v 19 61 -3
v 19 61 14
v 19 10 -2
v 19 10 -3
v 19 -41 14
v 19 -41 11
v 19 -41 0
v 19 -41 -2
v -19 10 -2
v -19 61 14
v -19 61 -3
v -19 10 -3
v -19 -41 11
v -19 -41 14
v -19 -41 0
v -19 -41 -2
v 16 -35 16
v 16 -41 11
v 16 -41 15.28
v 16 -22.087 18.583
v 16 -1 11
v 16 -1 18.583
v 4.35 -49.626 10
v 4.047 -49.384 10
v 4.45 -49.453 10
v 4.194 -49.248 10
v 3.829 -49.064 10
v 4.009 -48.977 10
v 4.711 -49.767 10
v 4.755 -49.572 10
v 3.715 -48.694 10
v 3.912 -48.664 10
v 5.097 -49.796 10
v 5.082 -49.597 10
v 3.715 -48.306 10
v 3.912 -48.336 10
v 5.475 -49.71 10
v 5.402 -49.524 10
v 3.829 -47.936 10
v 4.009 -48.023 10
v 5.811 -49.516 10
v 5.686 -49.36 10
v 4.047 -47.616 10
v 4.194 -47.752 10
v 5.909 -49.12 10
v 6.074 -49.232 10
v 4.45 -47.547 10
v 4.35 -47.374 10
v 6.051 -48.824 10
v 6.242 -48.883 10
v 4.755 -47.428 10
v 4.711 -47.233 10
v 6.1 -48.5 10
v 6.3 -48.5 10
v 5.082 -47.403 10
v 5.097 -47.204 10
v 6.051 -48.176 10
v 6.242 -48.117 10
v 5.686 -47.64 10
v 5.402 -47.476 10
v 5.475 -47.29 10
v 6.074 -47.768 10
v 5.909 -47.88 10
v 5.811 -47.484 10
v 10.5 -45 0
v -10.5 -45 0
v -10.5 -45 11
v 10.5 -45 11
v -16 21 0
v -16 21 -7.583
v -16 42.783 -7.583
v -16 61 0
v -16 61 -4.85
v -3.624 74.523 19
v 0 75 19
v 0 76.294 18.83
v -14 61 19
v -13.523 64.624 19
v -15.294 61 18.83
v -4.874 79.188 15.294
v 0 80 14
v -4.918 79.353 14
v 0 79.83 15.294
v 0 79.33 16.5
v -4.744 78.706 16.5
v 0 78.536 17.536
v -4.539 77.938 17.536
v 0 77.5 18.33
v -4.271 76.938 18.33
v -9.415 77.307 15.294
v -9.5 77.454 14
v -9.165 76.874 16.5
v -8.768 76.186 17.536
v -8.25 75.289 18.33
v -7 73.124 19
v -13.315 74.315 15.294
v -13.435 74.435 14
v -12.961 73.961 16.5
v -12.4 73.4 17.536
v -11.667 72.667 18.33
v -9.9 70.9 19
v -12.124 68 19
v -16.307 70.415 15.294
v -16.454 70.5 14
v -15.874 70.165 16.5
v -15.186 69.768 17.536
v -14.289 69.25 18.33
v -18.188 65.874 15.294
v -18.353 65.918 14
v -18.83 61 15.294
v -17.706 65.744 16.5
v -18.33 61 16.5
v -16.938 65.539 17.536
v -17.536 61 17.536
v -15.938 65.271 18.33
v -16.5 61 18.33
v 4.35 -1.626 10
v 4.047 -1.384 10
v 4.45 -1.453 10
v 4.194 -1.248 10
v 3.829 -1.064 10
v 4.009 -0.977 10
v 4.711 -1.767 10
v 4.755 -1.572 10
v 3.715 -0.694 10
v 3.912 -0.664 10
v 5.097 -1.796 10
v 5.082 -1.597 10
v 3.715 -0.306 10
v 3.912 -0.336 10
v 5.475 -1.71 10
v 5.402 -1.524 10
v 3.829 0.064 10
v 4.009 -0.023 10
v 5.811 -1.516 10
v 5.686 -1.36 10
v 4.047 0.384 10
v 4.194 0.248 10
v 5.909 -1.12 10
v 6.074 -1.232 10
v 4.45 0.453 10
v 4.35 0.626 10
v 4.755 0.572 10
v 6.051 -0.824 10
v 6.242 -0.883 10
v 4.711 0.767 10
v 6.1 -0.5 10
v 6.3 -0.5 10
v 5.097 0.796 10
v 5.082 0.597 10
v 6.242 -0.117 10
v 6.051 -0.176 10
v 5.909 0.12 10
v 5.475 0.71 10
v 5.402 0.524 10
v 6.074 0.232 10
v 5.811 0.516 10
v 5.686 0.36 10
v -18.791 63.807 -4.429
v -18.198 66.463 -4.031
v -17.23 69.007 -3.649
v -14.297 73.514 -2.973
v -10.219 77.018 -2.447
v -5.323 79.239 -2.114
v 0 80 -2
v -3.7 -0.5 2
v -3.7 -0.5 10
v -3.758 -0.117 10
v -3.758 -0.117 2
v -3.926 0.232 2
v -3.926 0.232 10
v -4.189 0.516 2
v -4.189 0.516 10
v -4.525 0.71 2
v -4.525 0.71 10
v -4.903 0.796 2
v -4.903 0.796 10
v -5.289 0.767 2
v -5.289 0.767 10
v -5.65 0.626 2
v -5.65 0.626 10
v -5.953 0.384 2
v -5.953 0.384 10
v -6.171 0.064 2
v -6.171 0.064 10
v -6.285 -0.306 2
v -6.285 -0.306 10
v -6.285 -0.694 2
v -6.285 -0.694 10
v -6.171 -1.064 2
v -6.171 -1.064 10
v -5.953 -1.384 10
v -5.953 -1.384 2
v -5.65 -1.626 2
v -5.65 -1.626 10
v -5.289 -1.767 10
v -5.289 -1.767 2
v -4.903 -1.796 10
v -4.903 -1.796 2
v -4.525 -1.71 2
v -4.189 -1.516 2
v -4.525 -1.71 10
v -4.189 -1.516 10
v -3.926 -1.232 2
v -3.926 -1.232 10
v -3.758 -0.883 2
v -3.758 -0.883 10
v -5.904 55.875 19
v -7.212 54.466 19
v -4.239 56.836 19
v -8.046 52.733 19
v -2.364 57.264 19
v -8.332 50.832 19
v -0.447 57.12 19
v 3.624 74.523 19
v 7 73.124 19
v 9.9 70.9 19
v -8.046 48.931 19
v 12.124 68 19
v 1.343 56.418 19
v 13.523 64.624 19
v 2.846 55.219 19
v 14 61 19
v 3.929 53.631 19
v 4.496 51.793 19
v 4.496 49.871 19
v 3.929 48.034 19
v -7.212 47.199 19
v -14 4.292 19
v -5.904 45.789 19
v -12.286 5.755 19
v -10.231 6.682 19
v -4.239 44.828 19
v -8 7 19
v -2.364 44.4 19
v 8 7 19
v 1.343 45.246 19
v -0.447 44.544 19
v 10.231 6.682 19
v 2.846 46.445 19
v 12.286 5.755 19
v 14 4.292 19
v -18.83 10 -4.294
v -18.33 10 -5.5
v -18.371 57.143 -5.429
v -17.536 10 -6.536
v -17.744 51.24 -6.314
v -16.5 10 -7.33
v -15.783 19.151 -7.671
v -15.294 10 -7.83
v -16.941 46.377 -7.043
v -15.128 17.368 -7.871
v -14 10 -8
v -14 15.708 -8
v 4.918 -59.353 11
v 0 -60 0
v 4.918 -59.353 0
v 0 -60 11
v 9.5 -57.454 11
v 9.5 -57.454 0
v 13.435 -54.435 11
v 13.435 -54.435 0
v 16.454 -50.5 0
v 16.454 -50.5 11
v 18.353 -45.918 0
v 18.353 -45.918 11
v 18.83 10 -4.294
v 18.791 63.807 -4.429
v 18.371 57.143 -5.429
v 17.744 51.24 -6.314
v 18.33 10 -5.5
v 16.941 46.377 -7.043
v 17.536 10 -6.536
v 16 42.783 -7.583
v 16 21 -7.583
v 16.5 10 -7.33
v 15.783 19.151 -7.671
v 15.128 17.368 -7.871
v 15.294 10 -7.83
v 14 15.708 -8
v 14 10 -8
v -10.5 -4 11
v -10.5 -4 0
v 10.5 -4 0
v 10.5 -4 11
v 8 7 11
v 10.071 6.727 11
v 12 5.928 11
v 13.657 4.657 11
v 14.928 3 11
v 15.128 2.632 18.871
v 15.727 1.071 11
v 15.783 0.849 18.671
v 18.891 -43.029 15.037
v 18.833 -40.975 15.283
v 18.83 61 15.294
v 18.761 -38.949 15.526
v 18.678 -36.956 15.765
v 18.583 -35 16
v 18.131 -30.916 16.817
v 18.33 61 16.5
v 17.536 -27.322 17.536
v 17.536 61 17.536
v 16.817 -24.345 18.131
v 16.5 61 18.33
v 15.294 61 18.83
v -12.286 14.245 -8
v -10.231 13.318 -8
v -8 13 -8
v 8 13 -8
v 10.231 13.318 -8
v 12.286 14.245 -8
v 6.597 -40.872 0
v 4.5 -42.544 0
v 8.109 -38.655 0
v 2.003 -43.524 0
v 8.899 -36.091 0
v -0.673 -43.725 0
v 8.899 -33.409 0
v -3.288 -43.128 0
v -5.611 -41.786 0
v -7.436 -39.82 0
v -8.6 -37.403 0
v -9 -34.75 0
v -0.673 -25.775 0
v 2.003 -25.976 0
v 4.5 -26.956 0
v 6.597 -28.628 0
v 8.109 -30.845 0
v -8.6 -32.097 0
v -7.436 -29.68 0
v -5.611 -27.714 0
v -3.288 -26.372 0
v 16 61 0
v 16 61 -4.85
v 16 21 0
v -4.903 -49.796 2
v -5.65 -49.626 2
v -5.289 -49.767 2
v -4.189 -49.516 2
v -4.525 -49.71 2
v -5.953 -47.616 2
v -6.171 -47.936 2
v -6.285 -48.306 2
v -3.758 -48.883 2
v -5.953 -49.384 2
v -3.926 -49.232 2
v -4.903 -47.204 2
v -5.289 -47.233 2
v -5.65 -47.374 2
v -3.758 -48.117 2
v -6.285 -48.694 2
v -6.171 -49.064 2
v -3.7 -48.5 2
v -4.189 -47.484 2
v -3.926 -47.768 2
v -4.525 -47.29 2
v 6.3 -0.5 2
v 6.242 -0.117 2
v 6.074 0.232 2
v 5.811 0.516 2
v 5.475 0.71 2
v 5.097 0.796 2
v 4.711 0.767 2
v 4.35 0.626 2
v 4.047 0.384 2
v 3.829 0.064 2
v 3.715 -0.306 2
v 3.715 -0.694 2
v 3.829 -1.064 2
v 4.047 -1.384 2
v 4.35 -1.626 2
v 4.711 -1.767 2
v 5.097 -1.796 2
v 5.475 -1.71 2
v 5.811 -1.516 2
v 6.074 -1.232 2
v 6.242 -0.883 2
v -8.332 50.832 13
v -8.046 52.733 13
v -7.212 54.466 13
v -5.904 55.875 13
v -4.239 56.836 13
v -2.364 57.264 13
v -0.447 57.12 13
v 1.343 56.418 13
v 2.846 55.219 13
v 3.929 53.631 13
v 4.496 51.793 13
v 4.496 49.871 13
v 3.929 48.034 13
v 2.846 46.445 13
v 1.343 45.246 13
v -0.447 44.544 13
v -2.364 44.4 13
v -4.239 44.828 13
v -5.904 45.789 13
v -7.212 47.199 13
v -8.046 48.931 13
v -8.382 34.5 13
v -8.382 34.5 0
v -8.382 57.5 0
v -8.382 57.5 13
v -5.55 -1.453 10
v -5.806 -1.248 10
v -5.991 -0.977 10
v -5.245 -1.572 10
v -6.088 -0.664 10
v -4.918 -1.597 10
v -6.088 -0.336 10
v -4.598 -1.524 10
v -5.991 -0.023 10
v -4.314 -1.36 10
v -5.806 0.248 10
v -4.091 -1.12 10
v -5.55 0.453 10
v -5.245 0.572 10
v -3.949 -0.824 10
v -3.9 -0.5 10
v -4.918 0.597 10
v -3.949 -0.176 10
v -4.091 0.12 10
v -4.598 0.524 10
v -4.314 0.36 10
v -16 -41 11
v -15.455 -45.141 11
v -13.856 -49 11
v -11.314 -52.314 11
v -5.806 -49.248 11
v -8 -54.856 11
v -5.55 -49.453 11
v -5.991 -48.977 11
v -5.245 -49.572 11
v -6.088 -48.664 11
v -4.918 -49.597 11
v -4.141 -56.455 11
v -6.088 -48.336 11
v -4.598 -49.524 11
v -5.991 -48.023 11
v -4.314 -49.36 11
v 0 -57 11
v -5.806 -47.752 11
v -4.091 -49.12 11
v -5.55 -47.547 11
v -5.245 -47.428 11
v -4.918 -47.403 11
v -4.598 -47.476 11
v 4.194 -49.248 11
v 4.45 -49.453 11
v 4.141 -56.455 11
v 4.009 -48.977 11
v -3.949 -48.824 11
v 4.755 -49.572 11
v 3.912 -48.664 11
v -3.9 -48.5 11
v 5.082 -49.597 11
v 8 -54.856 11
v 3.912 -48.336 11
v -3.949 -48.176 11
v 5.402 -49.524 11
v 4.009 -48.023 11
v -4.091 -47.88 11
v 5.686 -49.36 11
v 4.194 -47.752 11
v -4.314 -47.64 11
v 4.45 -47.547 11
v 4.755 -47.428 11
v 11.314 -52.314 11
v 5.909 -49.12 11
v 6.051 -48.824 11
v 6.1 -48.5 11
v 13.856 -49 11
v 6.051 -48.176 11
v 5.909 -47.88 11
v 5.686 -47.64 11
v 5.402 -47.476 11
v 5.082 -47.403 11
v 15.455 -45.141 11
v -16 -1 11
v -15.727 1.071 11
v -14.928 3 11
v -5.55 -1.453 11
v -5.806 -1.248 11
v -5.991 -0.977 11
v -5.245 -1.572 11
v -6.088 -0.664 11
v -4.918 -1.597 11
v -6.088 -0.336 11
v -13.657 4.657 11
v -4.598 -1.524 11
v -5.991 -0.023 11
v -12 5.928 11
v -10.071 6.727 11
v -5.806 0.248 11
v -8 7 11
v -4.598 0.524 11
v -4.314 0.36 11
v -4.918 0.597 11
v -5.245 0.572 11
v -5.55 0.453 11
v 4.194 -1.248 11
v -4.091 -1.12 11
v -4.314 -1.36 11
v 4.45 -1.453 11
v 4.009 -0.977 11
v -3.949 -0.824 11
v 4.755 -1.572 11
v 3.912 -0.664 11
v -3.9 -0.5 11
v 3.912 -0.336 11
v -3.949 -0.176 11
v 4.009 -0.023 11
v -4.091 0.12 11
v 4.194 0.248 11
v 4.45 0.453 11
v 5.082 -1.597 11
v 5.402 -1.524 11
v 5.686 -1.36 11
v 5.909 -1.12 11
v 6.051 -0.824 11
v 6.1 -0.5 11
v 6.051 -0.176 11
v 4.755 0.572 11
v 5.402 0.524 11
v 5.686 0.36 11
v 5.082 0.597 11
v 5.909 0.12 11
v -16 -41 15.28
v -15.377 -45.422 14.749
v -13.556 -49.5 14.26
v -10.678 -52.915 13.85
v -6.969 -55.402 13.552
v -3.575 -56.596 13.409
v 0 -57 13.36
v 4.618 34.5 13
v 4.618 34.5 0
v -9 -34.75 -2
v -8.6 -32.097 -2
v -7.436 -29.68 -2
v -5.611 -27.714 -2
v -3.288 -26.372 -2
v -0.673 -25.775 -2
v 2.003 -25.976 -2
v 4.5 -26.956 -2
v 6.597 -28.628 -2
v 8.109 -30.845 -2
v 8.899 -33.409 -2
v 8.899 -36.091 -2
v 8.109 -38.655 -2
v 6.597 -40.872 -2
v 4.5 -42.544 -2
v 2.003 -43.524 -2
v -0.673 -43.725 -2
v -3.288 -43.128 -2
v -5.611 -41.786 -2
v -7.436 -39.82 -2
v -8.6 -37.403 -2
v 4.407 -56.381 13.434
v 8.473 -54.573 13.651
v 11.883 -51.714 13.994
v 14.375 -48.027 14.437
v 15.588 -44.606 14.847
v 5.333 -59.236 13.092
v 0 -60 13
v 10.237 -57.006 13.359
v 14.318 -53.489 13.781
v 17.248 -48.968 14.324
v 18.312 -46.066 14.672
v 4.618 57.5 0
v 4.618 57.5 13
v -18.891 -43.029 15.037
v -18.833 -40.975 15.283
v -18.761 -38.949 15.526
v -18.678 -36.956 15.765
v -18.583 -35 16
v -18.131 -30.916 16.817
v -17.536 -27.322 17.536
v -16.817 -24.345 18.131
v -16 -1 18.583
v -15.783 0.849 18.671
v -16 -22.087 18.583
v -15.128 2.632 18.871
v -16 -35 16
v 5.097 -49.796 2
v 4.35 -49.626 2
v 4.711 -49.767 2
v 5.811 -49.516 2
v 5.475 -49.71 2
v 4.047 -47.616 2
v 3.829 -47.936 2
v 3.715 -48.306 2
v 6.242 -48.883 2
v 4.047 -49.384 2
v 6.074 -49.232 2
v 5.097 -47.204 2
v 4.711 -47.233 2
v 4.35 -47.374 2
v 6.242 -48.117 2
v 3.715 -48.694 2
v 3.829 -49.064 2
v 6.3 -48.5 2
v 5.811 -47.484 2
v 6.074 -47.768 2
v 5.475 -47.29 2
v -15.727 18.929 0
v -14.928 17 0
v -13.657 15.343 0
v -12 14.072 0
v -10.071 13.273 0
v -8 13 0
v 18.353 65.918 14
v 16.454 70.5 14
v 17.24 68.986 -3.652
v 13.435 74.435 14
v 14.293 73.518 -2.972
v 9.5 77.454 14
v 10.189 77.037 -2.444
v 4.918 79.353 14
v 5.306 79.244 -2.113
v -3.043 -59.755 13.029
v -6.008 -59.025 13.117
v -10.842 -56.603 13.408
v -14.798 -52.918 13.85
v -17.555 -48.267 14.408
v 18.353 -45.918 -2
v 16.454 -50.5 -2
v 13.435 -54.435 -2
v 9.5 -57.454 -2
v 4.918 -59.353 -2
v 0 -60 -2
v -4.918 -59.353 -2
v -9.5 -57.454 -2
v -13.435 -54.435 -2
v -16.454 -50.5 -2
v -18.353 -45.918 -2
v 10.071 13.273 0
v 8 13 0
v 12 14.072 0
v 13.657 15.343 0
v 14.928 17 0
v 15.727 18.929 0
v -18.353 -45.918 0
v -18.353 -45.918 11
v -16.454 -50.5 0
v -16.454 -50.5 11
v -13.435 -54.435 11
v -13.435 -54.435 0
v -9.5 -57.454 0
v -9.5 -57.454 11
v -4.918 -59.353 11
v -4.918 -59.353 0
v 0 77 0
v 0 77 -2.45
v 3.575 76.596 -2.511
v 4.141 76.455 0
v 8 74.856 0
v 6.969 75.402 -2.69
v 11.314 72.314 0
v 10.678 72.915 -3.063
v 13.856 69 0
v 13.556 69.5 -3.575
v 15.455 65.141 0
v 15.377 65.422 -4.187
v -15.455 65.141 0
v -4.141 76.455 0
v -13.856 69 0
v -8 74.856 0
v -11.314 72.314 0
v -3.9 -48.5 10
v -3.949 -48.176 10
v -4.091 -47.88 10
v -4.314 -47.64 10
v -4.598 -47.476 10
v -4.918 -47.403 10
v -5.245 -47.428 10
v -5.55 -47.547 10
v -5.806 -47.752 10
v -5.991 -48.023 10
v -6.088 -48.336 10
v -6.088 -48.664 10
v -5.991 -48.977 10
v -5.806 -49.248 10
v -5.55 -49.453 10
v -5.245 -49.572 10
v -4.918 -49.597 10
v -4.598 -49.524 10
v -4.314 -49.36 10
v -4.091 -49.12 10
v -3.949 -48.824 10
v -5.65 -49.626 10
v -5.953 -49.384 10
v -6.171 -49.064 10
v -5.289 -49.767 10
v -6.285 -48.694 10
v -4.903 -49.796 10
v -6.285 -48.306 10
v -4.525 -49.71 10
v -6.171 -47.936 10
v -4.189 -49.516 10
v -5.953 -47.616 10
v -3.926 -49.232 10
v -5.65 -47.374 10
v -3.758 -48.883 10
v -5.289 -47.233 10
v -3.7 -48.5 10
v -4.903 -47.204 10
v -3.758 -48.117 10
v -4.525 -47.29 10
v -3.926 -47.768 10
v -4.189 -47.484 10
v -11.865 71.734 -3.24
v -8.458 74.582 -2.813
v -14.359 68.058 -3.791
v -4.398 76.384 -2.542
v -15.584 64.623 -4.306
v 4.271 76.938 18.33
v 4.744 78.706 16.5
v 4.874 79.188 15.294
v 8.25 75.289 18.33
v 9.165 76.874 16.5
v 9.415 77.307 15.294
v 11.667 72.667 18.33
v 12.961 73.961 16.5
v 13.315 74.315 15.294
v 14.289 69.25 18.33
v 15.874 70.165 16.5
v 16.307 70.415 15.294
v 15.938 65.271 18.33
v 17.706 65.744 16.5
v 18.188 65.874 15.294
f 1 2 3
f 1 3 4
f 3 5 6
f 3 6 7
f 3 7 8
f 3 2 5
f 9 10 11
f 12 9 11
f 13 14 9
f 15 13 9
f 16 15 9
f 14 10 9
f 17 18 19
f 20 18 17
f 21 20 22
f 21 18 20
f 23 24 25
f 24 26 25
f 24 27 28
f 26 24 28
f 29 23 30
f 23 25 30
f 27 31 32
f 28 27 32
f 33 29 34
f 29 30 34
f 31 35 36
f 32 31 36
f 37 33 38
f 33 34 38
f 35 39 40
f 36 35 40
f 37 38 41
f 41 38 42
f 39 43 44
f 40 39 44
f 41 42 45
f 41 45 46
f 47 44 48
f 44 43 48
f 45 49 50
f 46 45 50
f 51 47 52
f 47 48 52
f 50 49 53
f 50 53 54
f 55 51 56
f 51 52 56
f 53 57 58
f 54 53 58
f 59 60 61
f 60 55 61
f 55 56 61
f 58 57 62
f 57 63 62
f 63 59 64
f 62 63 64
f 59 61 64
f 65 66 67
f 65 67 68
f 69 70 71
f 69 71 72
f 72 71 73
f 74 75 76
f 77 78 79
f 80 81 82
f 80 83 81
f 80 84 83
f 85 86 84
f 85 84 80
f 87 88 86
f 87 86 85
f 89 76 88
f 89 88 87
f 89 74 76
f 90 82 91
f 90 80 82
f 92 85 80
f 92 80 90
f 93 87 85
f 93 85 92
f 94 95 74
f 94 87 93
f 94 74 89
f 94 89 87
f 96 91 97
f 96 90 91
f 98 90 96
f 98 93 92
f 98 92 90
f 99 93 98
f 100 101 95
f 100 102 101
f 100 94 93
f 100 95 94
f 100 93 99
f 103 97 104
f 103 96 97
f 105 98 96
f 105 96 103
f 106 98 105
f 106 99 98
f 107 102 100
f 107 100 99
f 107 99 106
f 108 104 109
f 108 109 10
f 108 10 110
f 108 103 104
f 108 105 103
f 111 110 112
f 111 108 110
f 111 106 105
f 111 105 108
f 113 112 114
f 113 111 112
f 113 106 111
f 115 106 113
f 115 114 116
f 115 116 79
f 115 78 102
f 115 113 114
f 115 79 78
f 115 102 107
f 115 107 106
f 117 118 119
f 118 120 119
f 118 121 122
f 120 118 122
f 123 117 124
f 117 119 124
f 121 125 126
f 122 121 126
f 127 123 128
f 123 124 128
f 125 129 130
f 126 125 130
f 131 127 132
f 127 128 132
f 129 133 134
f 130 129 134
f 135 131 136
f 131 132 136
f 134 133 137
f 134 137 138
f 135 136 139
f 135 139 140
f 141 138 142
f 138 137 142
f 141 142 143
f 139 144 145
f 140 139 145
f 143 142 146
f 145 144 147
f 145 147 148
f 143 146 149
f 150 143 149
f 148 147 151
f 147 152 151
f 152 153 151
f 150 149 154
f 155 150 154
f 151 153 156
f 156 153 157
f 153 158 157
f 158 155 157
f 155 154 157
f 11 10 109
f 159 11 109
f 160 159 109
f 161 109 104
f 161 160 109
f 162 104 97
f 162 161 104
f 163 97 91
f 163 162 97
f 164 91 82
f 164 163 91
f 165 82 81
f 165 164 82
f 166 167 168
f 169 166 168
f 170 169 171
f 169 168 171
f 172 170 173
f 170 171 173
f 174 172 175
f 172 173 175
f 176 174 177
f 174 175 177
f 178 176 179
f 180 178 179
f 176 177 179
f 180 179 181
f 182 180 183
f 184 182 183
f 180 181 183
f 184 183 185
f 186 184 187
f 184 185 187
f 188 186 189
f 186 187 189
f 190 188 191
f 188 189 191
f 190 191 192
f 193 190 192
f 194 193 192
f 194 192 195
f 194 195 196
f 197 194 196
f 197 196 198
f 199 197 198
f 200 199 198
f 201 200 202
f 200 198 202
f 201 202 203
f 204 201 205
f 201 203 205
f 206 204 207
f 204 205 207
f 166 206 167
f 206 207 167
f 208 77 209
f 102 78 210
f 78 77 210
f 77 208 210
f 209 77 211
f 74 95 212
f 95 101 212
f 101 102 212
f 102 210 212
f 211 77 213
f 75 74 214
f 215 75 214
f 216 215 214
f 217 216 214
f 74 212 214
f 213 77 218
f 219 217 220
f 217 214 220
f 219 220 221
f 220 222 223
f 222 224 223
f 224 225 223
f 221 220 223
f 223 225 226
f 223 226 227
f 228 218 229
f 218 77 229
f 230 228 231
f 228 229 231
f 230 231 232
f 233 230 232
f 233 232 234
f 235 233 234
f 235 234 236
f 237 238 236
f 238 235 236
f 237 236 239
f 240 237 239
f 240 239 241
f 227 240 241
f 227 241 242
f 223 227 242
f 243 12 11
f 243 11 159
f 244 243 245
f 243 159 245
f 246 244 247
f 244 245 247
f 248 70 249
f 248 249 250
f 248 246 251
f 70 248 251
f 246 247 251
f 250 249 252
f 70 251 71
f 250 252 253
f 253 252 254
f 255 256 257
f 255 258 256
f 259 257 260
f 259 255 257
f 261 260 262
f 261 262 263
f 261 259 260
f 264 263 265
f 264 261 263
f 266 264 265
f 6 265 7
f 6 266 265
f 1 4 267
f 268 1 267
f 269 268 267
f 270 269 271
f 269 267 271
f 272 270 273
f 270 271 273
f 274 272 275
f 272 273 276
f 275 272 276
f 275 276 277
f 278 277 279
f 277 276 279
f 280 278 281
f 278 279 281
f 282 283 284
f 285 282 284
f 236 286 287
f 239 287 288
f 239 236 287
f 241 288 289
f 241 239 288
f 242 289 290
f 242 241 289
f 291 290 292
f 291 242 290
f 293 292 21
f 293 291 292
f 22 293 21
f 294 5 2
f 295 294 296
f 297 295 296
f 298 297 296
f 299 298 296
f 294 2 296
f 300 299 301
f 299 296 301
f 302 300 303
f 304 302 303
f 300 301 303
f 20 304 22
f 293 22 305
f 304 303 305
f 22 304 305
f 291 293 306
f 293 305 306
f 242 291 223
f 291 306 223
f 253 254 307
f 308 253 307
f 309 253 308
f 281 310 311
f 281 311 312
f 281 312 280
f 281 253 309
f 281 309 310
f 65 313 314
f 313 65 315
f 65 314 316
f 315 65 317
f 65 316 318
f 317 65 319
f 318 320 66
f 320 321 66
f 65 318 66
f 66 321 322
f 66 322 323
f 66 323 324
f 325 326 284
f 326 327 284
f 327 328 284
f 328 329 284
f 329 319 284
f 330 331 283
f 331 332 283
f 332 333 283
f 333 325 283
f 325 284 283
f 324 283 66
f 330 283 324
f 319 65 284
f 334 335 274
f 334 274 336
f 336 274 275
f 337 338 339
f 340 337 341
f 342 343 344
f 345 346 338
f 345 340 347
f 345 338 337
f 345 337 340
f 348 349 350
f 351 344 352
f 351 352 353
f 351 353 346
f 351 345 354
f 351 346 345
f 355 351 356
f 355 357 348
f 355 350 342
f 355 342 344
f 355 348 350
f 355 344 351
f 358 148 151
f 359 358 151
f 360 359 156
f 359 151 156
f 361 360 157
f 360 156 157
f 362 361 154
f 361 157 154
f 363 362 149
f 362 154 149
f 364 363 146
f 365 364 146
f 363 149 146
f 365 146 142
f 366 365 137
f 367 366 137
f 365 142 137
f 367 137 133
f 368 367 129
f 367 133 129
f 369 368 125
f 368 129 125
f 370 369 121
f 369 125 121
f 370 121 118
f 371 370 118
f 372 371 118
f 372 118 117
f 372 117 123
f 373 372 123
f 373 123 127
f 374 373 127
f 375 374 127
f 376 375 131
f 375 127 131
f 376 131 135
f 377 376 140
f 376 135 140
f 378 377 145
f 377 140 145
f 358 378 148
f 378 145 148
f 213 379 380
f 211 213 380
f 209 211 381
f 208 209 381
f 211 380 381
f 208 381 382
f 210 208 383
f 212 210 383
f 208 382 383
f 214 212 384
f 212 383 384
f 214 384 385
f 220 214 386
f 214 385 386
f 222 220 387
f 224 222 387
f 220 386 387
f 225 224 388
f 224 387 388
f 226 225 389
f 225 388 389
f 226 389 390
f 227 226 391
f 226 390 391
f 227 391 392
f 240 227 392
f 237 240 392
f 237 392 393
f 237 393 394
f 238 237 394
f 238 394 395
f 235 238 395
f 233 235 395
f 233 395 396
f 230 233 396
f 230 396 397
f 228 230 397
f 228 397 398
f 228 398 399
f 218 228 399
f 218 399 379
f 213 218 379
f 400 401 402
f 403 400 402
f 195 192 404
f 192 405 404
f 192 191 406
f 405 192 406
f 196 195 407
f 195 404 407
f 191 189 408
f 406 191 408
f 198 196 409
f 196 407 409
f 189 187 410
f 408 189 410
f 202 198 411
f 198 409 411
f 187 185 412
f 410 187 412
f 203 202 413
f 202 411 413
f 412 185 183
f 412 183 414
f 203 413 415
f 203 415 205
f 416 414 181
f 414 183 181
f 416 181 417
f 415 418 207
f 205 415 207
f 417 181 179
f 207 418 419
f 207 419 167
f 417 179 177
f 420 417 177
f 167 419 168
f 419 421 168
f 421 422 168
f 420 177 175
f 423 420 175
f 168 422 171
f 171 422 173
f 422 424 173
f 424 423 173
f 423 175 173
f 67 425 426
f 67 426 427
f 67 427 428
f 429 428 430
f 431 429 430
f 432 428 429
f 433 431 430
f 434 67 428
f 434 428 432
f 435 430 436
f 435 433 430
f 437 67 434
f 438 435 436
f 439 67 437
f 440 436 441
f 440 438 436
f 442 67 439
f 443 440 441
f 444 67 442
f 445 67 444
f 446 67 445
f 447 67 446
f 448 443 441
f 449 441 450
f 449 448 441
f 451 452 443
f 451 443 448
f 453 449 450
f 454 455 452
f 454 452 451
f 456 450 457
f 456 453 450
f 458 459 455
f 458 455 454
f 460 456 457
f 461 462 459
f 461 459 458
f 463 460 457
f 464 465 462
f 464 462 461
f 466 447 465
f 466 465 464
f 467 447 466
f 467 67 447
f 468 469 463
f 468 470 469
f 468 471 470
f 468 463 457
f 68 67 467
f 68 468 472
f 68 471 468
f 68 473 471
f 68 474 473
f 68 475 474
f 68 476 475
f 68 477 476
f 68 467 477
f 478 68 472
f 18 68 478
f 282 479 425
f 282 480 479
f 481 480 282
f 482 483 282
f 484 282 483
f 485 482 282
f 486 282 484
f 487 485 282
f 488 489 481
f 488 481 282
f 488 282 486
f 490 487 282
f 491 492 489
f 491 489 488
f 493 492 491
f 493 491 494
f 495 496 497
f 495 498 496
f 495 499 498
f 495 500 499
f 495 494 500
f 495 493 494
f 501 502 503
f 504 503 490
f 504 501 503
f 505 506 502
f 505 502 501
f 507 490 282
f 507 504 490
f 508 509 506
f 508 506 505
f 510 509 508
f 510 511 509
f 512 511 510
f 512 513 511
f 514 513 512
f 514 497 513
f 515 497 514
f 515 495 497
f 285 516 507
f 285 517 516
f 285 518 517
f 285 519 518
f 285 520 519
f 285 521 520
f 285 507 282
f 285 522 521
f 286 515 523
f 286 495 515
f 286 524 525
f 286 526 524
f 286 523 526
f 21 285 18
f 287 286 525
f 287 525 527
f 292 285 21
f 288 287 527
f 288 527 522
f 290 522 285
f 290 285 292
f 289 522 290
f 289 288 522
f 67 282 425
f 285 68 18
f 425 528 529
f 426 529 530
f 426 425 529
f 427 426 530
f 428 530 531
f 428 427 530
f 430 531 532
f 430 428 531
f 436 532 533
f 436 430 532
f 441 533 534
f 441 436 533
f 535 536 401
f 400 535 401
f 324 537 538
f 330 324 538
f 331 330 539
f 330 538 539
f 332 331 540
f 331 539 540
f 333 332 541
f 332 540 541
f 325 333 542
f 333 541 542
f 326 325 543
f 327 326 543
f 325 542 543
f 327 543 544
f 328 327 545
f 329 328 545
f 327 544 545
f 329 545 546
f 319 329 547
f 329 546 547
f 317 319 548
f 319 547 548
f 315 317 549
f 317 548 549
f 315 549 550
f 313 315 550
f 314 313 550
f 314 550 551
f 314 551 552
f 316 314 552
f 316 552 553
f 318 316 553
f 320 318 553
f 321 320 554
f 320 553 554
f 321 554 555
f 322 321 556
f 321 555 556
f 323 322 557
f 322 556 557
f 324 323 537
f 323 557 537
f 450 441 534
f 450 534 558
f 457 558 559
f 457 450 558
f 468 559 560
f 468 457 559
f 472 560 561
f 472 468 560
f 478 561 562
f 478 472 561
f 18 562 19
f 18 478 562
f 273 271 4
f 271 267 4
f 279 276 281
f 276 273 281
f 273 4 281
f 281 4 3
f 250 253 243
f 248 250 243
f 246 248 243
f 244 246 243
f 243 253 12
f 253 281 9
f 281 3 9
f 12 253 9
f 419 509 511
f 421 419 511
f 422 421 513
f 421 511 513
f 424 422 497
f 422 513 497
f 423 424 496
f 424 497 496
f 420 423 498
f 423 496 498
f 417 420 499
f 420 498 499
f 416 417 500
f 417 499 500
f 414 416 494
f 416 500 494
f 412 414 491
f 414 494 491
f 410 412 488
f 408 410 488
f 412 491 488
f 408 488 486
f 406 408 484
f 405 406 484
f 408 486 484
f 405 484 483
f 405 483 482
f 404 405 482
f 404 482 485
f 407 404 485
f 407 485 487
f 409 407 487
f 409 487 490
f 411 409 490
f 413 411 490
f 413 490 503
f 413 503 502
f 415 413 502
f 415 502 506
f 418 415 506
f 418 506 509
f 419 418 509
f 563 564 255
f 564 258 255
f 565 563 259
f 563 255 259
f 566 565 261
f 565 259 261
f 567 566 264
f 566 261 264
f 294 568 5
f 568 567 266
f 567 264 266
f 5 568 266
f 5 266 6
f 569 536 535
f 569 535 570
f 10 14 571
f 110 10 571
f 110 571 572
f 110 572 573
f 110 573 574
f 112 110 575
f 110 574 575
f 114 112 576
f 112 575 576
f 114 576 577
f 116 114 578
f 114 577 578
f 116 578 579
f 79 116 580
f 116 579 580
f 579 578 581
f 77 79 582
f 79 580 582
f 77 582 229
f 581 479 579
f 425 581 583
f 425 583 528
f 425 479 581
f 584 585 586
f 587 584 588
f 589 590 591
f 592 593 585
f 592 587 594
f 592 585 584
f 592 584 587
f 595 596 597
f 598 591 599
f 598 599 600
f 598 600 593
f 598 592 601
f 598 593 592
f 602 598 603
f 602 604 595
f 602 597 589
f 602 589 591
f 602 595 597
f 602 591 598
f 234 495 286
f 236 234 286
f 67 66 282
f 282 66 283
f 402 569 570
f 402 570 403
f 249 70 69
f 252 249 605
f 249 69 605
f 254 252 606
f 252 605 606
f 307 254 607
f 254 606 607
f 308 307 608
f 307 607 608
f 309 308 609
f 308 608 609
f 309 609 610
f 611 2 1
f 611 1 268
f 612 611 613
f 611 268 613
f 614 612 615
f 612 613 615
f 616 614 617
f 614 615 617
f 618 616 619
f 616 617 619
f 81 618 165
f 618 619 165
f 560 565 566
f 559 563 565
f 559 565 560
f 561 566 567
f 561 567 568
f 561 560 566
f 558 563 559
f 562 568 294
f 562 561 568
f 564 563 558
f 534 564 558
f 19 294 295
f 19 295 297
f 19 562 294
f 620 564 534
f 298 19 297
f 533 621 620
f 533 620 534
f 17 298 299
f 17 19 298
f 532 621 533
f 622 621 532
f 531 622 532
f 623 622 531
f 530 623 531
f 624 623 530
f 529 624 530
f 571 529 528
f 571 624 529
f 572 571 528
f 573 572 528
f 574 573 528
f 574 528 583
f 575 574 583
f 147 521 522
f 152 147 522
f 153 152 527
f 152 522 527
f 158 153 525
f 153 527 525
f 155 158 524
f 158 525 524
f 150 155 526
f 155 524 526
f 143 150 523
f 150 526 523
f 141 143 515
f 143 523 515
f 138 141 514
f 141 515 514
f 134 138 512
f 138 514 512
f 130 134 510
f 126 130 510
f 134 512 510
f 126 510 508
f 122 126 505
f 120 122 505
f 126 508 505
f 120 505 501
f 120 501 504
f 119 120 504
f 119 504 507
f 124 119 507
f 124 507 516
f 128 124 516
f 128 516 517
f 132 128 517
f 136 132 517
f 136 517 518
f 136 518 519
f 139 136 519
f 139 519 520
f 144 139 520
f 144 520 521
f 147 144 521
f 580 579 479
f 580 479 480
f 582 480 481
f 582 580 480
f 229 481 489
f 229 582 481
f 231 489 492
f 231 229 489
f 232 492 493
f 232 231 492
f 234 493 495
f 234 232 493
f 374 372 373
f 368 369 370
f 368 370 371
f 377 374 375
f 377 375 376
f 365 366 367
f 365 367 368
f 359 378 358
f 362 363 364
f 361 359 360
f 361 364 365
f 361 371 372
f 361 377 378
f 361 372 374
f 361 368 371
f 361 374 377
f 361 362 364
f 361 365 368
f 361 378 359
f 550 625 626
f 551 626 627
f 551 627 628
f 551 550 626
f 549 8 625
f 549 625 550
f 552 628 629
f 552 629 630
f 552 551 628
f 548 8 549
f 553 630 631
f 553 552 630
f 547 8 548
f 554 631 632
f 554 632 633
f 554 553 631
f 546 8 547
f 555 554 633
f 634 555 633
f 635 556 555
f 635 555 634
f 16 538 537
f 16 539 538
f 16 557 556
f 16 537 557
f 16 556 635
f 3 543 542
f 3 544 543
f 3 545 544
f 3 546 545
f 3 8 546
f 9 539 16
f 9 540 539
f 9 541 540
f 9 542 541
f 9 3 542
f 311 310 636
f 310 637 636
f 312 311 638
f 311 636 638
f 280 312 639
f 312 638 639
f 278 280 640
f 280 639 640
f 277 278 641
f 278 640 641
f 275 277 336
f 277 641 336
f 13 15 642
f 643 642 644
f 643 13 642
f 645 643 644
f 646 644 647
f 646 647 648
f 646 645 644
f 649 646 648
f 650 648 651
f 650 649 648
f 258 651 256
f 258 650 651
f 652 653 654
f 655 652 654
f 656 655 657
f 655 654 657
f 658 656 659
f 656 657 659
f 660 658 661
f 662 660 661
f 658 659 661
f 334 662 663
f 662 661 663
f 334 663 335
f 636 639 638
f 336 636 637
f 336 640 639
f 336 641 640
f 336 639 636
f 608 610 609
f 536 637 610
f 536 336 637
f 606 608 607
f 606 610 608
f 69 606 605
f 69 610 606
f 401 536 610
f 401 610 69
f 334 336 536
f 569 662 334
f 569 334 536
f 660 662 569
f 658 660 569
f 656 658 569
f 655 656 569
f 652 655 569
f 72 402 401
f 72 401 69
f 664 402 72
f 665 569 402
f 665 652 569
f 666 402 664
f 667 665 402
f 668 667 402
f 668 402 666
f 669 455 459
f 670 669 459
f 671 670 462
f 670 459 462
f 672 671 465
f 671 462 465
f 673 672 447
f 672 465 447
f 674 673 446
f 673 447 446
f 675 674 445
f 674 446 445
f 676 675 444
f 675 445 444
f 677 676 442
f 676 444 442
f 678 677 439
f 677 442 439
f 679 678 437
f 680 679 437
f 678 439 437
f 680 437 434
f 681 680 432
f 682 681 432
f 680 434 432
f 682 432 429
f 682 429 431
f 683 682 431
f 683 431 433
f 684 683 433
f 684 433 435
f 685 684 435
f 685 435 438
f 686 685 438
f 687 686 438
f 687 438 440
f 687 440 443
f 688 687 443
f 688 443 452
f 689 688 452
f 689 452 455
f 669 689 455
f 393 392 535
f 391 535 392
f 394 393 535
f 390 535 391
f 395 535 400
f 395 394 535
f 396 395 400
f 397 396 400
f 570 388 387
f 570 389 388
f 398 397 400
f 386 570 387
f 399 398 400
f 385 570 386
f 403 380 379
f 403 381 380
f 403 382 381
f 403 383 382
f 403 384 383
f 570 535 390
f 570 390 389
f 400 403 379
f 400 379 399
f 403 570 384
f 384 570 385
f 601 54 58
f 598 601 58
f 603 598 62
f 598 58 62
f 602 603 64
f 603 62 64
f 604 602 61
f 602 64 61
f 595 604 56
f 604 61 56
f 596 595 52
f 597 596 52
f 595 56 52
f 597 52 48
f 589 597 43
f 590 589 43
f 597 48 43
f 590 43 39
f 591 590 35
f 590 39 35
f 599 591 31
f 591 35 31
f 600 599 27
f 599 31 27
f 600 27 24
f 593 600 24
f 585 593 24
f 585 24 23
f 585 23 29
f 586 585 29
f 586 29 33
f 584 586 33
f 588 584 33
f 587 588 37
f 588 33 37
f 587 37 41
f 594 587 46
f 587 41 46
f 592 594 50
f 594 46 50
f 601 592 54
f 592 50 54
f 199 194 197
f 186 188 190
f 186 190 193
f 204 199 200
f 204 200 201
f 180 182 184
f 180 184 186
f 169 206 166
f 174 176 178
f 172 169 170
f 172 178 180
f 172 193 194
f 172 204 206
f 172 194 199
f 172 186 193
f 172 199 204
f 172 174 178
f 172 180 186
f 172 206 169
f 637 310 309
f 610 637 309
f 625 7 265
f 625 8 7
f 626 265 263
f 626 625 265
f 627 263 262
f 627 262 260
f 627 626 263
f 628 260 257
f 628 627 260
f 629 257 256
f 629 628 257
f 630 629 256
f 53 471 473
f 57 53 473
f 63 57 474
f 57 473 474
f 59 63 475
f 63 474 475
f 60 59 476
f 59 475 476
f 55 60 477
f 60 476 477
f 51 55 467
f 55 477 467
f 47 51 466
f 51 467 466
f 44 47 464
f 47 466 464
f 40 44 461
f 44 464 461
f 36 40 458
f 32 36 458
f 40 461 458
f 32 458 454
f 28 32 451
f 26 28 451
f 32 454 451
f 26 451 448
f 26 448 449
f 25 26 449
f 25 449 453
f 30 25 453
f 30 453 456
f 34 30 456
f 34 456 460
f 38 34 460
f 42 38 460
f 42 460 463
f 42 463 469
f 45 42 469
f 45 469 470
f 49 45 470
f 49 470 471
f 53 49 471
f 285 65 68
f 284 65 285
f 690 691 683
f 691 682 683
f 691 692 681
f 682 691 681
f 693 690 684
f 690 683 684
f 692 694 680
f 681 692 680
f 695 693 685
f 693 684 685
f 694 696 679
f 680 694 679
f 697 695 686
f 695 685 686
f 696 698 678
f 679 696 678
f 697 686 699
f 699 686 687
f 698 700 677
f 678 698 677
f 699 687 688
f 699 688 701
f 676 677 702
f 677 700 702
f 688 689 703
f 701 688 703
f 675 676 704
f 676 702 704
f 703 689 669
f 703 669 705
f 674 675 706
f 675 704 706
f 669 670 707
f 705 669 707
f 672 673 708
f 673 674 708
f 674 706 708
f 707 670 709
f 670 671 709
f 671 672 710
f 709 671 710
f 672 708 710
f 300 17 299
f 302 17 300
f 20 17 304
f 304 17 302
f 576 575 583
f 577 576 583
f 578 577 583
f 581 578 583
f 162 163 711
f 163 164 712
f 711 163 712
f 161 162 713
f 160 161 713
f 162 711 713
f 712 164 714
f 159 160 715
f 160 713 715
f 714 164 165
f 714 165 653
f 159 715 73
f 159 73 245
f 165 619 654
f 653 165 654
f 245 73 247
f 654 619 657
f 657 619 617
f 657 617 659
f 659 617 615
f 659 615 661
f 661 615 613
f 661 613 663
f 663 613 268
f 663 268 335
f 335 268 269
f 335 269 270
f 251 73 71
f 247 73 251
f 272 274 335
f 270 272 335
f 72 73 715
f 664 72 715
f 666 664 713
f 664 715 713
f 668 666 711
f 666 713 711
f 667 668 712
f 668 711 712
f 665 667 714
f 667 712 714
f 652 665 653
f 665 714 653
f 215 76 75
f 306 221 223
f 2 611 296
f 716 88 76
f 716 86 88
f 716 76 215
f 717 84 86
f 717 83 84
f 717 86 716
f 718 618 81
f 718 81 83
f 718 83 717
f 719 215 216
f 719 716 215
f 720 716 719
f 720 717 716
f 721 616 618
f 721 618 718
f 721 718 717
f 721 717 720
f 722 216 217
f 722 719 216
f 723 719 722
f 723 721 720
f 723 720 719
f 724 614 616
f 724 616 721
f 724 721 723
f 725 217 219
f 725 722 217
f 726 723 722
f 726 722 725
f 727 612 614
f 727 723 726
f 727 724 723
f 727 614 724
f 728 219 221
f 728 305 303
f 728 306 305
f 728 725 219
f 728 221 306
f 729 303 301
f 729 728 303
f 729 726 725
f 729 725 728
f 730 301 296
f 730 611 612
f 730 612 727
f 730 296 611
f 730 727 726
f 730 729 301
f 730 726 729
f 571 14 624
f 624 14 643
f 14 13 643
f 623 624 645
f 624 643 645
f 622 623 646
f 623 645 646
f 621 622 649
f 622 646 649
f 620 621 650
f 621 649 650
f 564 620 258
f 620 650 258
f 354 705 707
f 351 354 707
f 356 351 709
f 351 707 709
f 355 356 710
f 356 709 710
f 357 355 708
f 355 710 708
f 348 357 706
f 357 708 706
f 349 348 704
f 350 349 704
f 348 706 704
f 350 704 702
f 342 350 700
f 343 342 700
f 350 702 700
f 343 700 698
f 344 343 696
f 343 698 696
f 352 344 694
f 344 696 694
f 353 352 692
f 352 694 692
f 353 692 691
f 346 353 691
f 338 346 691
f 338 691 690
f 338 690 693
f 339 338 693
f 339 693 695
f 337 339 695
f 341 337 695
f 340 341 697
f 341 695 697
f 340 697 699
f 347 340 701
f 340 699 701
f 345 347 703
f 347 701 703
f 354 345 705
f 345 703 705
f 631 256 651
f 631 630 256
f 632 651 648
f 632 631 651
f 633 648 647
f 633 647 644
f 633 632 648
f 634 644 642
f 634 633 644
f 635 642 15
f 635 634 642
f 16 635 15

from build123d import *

# Parameters (mm, degrees)
SKETCH1_W               = 38
SKETCH1_H               = 120
SKETCH1_W_2             = 21
SKETCH1_H_2             = 41
BOSS_EXTRUDE1_DEPTH     = 11
SKETCH3_R               = 1.3
CUT_EXTRUDE1_DEPTH      = 8
FILLET3_R               = 19
BOSS_EXTRUDE2_DEPTH     = 8
CUT_EXTRUDE2_DEPTH      = 66.741919656
CUT_EXTRUDE2_DEPTH_BACK = 66.741919656
SKETCH7_W               = 32
SKETCH7_H               = 50
BOSS_EXTRUDE4_DEPTH     = 8
SKETCH8_W               = 38
SKETCH8_H               = 50
BOSS_EXTRUDE5_DEPTH     = 8
BOSS_EXTRUDE10_START    = 2
SKETCH27_R              = 9
BOSS_EXTRUDE10_DEPTH    = 2
SKETCH28_W              = 38
SKETCH28_H              = 27
BOSS_EXTRUDE11_DEPTH    = 20
FILLET4_R               = 19
CUT_EXTRUDE14_DEPTH     = 8
CUT_EXTRUDE18_DEPTH     = 91.581455056
FILLET7_R               = 5
SKETCH35_R              = 1.1
CUT_EXTRUDE20_DEPTH     = 8
FILLET8_R               = 8
SKETCH36_R              = 6.45
CUT_EXTRUDE21_DEPTH     = 85.391942883
SKETCH30_W              = 13
SKETCH30_H              = 23
CUT_EXTRUDE22_DEPTH     = 13


# Some blends are built 0.0001 mm under size
with BuildPart() as part:
    # Sketch1 → Boss-Extrude1 (new body)
    with BuildSketch(Plane.XY):
        Rectangle(SKETCH1_W, SKETCH1_H)
        with Locations((0, -24.5)):
            Rectangle(SKETCH1_W_2, SKETCH1_H_2, mode=Mode.SUBTRACT)
    extrude(amount=BOSS_EXTRUDE1_DEPTH)

    # Sketch3 → Cut-Extrude1 (cut)
    with BuildSketch(Plane.XY.offset(10)):
        with Locations((-5, -0.5)):
            Circle(SKETCH3_R)
        with Locations((5, -0.5)):
            Circle(SKETCH3_R)
        with Locations((5, -48.5)):
            Circle(SKETCH3_R)
        with Locations((-5, -48.5)):
            Circle(SKETCH3_R)
    extrude(amount=-CUT_EXTRUDE1_DEPTH, mode=Mode.SUBTRACT)

    # Fillet3
    fillet3_edges = [part.edges().sort_by_distance(p)[0] for p in [
        (19, -60, 5.5),
        (-19, -60, 5.5),
    ]]
    fillet(fillet3_edges, radius=FILLET3_R - 0.0001)  # a hair under: the kernel refuses the full size

    # Sketch4 → Boss-Extrude2 (add)
    with BuildSketch(Plane.XY.offset(11)):
        with BuildLine():
            Line((19, -41), (19, 60))
            Line((19, 60), (-19, 60))
            Line((-19, 60), (-19, -41))
            ThreePointArc((-19, -41), (-13.435028843, -54.435028843), (0, -60))
            ThreePointArc((0, -60), (13.435028843, -54.435028843), (19, -41))
        make_face()
        with BuildLine():
            Line((16, -41), (16, 57))
            Line((16, 57), (-16, 57))
            Line((-16, 57), (-16, -41))
            ThreePointArc((-16, -41), (-11.313708499, -52.313708499), (0, -57))
            ThreePointArc((0, -57), (11.313708499, -52.313708499), (16, -41))
        make_face(mode=Mode.SUBTRACT)
    extrude(amount=BOSS_EXTRUDE2_DEPTH)

    # Sketch6 → Cut-Extrude2 (cut, two sides: drawn at the far end of the back side and taken through both)
    with BuildSketch(Plane(origin=(0, 0, 0), x_dir=(0, 0, -1), z_dir=(1, 0, 0)).offset(-CUT_EXTRUDE2_DEPTH_BACK)):
        Polygon((-13, -60), (-16, -35), (-19, -20), (-19, -60), align=None)
    extrude(amount=CUT_EXTRUDE2_DEPTH + CUT_EXTRUDE2_DEPTH_BACK, mode=Mode.SUBTRACT)

    # Sketch7 → Boss-Extrude4 (add)
    with BuildSketch(Plane.XY.offset(11)):
        with Locations((0, 32)):
            Rectangle(SKETCH7_W, SKETCH7_H)
    extrude(amount=BOSS_EXTRUDE4_DEPTH)

    # Sketch8 → Boss-Extrude5 (add)
    with BuildSketch(Plane(origin=(0, 0, 0), x_dir=(-1, 0, 0), z_dir=(0, 0, -1))):
        with Locations((0, 35)):
            Rectangle(SKETCH8_W, SKETCH8_H)
    extrude(amount=BOSS_EXTRUDE5_DEPTH)

    # Sketch27 → Boss-Extrude10 (add)
    with BuildSketch(Plane(origin=(0, 0, 0), x_dir=(-1, 0, 0), z_dir=(0, 0, -1)).offset(BOSS_EXTRUDE10_START)):
        with BuildLine():
            Line((19, -41), (19, 10))
            Line((19, 10), (-19, 10))
            Line((-19, 10), (-19, -41))
            ThreePointArc((-19, -41), (-13.435028843, -54.435028843), (0, -60))
            ThreePointArc((0, -60), (13.435028843, -54.435028843), (19, -41))
        make_face()
        with Locations((0, -34.75)):
            Circle(SKETCH27_R, mode=Mode.SUBTRACT)
    extrude(amount=-BOSS_EXTRUDE10_DEPTH)

    # Sketch28 → Boss-Extrude11 (add)
    with BuildSketch(Plane(origin=(0, 60, 0), x_dir=(1, 0, 0), z_dir=(0, 1, 0))):
        with Locations((0, -5.5)):
            Rectangle(SKETCH28_W, SKETCH28_H)
    extrude(amount=BOSS_EXTRUDE11_DEPTH)

    # Fillet4
    fillet4_edges = [part.edges().sort_by_distance(p)[0] for p in [
        (-19, 80, 5.5),
        (19, 80, 5.5),
    ]]
    fillet(fillet4_edges, radius=FILLET4_R - 0.0001)  # a hair under: the kernel refuses the full size

    # Sketch29 → Cut-Extrude14 (cut)
    with BuildSketch(Plane(origin=(0, 0, -8), x_dir=(-1, 0, 0), z_dir=(0, 0, -1))):
        with BuildLine():
            Line((16, 13), (16, 61))
            ThreePointArc((16, 61), (11.313708499, 72.313708499), (0, 77))
            ThreePointArc((0, 77), (-11.313708499, 72.313708499), (-16, 61))
            Line((-16, 61), (-16, 13))
            Line((-16, 13), (16, 13))
        make_face()
    extrude(amount=-CUT_EXTRUDE14_DEPTH, mode=Mode.SUBTRACT)

    # Sketch33 → Cut-Extrude18 (cut, through all)
    with BuildSketch(Plane(origin=(19, 0, 0), x_dir=(0, 0, -1), z_dir=(1, 0, 0))):
        Polygon((2, 80), (8, 40), (8, 80), align=None)
    extrude(amount=-CUT_EXTRUDE18_DEPTH, mode=Mode.SUBTRACT)

    # Fillet7
    # the kernel refuses this fillet: 5 mm, written as the material it takes off along each edge
    with BuildSketch(Plane(origin=(-19, 77.5, -8), x_dir=(0, 0, 1), z_dir=(0, -1, 0)), Plane(origin=(19, -2.5, -8), x_dir=(0, 0, 1), z_dir=(0, 1, 0))) as fillet7_piece_1:
        with BuildLine():
            CenterArc((FILLET7_R, -FILLET7_R), FILLET7_R, 90, 90)
            Line((0, -FILLET7_R), (0, 0))
            Line((0, 0), (FILLET7_R, 0))
        make_face()
    extrude(amount=80, mode=Mode.SUBTRACT)
    with BuildSketch(Plane(origin=(-19, -57.5, 19), x_dir=(1, 0, 0), z_dir=(0, 1, 0)), Plane(origin=(19, 61.0001, 19), x_dir=(-1, 0, 0), z_dir=(0, -1, 0))) as fillet7_piece_2:
        with BuildLine():
            CenterArc((FILLET7_R, FILLET7_R), FILLET7_R, 180, 90)
            Line((0, FILLET7_R), (0, 0))
            Line((0, 0), (FILLET7_R, 0))
        make_face()
    extrude(amount=118.5001, mode=Mode.SUBTRACT)
    with BuildSketch(Plane(origin=(0.0001, 61.0001, 19), x_dir=(0, 1, 0), z_dir=(-1, 0, 0))) as fillet7_piece_3:
        with BuildLine():
            CenterArc((18.9999 - FILLET7_R, FILLET7_R), FILLET7_R, 270, 90)
            Line((18.9999, FILLET7_R), (18.9999, 0))
            Line((18.9999, 0), (18.9999 - FILLET7_R, 0))
        make_face()
    revolve(axis=Axis((0.0001, 61.0001, 19), (0, 0, -1)), revolution_arc=90, mode=Mode.SUBTRACT)
    with BuildSketch(Plane(origin=(-0.0001, 61.0001, 19), x_dir=(0, 1, 0), z_dir=(1, 0, 0))) as fillet7_piece_4:
        with BuildLine():
            CenterArc((18.9999 - FILLET7_R, -FILLET7_R), FILLET7_R, 0, 90)
            Line((18.9999, -FILLET7_R), (18.9999, 0))
            Line((18.9999, 0), (18.9999 - FILLET7_R, 0))
        make_face()
    revolve(axis=Axis((-0.0001, 61.0001, 19), (0, 0, 1)), revolution_arc=90, mode=Mode.SUBTRACT)
    with BuildSketch(Plane(origin=(-0.0001, 80, 19), x_dir=(0, -1, 0), z_dir=(1, 0, 0))) as fillet7_piece_5:
        with BuildLine():
            CenterArc((FILLET7_R, FILLET7_R), FILLET7_R, 180, 90)
            Line((0, FILLET7_R), (0, 0))
            Line((0, 0), (FILLET7_R, 0))
        make_face()
    extrude(amount=0.0002, mode=Mode.SUBTRACT)

    # Sketch35 → Cut-Extrude20 (cut)
    with BuildSketch(Plane.XY.offset(11)):
        with Locations((-5, -0.5)):
            Circle(SKETCH35_R)
        with Locations((5, -0.5)):
            Circle(SKETCH35_R)
        with Locations((5, -48.5)):
            Circle(SKETCH35_R)
        with Locations((-5, -48.5)):
            Circle(SKETCH35_R)
    extrude(amount=-CUT_EXTRUDE20_DEPTH, mode=Mode.SUBTRACT)

    # Fillet8
    fillet8_edges = [part.edges().sort_by_distance(p)[0] for p in [
        (-16, 7, 14.791287847),
        (16, 7, 14.791287847),
        (16, 13, -3.791287847),
        (-16, 13, -3.791287847),
    ]]
    fillet(fillet8_edges, radius=FILLET8_R)

    # Sketch36 → Cut-Extrude21 (cut, through all)
    with BuildSketch(Plane(origin=(0, 0, 0), x_dir=(-1, 0, 0), z_dir=(0, 0, -1))):
        with Locations((1.882410705, 50.832111393)):
            Circle(SKETCH36_R)
    extrude(amount=-CUT_EXTRUDE21_DEPTH, mode=Mode.SUBTRACT)

    # Sketch30 → Cut-Extrude22 (cut)
    with BuildSketch(Plane(origin=(0, 0, 0), x_dir=(-1, 0, 0), z_dir=(0, 0, -1))):
        with Locations((1.882410705, 46)):
            Rectangle(SKETCH30_W, SKETCH30_H)
    extrude(amount=-CUT_EXTRUDE22_DEPTH, mode=Mode.SUBTRACT)


solid = part.part
